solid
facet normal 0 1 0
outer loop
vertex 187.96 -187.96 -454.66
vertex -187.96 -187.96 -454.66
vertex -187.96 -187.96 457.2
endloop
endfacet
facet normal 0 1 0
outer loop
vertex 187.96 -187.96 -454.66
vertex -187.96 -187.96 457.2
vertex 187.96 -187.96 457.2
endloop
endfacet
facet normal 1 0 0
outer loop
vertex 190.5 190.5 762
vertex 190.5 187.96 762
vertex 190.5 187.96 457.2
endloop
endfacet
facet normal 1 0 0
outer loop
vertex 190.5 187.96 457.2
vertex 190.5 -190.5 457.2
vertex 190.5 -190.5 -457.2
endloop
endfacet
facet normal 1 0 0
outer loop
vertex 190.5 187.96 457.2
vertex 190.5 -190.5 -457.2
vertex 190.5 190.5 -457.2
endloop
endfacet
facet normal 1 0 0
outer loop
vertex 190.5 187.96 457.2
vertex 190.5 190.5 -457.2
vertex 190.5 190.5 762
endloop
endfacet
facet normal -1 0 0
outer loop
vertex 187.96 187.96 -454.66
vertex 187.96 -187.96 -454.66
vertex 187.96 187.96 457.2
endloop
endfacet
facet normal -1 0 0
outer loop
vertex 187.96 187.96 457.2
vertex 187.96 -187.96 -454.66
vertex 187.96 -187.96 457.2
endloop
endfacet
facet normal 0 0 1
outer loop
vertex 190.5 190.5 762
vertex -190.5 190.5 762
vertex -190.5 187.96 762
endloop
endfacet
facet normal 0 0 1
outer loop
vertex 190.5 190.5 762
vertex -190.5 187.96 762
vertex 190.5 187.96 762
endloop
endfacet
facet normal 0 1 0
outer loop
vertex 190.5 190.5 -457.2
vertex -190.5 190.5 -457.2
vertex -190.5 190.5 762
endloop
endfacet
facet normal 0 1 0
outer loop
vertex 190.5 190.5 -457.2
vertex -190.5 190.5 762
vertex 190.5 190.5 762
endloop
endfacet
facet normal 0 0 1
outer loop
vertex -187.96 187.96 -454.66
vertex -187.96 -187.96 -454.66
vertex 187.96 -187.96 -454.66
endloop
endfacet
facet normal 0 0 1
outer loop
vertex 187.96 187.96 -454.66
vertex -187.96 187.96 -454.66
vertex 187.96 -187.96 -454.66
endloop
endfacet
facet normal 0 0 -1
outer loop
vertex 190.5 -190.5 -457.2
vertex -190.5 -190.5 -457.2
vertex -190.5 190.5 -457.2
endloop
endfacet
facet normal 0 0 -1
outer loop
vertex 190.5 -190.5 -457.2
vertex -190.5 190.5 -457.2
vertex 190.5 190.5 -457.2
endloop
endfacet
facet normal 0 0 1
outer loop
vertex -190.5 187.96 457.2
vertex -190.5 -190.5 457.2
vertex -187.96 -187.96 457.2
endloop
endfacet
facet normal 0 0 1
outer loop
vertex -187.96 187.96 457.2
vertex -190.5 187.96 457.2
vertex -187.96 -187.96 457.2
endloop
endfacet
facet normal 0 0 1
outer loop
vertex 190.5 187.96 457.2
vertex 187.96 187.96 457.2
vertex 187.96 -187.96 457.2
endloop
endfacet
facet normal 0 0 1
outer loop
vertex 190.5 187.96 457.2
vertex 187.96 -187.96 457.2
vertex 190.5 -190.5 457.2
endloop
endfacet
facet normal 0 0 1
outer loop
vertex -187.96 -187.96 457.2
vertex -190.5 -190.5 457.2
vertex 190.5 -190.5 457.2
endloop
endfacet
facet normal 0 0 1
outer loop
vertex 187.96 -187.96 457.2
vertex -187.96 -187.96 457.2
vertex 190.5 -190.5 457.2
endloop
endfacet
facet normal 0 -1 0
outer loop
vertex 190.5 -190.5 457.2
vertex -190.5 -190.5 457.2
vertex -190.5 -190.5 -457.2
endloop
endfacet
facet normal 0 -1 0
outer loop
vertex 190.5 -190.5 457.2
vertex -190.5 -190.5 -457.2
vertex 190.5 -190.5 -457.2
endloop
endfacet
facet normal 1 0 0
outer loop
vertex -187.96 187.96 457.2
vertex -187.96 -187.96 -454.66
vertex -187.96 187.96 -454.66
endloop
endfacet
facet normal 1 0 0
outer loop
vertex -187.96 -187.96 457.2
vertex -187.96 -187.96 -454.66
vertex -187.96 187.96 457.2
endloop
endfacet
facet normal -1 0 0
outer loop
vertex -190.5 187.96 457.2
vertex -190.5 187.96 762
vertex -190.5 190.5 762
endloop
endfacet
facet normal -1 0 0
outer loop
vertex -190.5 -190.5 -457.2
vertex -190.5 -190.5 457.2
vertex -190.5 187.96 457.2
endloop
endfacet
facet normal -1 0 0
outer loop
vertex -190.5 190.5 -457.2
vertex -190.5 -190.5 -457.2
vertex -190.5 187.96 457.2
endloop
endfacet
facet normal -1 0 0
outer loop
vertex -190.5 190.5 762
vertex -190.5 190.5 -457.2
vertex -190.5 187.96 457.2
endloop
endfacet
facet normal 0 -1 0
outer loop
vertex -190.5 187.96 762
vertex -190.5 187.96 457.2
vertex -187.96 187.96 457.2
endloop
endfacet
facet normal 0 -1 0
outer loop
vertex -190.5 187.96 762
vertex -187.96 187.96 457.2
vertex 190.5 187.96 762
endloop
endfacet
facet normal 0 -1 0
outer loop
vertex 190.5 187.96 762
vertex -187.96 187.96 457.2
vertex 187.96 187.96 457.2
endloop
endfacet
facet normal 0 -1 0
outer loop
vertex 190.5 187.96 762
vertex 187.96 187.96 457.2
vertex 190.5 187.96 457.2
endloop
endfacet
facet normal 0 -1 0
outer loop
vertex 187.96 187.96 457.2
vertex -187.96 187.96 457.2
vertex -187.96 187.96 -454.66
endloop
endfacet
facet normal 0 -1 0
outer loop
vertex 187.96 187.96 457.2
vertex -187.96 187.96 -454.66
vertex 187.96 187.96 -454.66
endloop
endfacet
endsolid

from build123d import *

# Parameters (mm, degrees)
F0_W     = 381
F0_H     = 914.4
F1_DEPTH = 190.5
F2_T     = -2.54
F3_W     = 381
F3_H     = 2.54
F4_DEPTH = 304.8


with BuildPart() as f1:
    # F0 (on Front) → F1 (new body, symmetric)
    with BuildSketch(Plane.XZ):
        Rectangle(F0_W, F0_H)
    extrude(amount=F1_DEPTH, both=True)

    # F2
    f2_openings = [f1.faces().sort_by_distance(p)[0] for p in [
        (0, 0, 457.2),
    ]]
    offset(amount=F2_T, openings=f2_openings)

    # F3 (on face) → F4 (join)
    with BuildSketch(Plane.XY.offset(457.2)):
        with Locations((0, 189.23)):
            Rectangle(F3_W, F3_H)
    extrude(amount=F4_DEPTH)


solid = f1.part
